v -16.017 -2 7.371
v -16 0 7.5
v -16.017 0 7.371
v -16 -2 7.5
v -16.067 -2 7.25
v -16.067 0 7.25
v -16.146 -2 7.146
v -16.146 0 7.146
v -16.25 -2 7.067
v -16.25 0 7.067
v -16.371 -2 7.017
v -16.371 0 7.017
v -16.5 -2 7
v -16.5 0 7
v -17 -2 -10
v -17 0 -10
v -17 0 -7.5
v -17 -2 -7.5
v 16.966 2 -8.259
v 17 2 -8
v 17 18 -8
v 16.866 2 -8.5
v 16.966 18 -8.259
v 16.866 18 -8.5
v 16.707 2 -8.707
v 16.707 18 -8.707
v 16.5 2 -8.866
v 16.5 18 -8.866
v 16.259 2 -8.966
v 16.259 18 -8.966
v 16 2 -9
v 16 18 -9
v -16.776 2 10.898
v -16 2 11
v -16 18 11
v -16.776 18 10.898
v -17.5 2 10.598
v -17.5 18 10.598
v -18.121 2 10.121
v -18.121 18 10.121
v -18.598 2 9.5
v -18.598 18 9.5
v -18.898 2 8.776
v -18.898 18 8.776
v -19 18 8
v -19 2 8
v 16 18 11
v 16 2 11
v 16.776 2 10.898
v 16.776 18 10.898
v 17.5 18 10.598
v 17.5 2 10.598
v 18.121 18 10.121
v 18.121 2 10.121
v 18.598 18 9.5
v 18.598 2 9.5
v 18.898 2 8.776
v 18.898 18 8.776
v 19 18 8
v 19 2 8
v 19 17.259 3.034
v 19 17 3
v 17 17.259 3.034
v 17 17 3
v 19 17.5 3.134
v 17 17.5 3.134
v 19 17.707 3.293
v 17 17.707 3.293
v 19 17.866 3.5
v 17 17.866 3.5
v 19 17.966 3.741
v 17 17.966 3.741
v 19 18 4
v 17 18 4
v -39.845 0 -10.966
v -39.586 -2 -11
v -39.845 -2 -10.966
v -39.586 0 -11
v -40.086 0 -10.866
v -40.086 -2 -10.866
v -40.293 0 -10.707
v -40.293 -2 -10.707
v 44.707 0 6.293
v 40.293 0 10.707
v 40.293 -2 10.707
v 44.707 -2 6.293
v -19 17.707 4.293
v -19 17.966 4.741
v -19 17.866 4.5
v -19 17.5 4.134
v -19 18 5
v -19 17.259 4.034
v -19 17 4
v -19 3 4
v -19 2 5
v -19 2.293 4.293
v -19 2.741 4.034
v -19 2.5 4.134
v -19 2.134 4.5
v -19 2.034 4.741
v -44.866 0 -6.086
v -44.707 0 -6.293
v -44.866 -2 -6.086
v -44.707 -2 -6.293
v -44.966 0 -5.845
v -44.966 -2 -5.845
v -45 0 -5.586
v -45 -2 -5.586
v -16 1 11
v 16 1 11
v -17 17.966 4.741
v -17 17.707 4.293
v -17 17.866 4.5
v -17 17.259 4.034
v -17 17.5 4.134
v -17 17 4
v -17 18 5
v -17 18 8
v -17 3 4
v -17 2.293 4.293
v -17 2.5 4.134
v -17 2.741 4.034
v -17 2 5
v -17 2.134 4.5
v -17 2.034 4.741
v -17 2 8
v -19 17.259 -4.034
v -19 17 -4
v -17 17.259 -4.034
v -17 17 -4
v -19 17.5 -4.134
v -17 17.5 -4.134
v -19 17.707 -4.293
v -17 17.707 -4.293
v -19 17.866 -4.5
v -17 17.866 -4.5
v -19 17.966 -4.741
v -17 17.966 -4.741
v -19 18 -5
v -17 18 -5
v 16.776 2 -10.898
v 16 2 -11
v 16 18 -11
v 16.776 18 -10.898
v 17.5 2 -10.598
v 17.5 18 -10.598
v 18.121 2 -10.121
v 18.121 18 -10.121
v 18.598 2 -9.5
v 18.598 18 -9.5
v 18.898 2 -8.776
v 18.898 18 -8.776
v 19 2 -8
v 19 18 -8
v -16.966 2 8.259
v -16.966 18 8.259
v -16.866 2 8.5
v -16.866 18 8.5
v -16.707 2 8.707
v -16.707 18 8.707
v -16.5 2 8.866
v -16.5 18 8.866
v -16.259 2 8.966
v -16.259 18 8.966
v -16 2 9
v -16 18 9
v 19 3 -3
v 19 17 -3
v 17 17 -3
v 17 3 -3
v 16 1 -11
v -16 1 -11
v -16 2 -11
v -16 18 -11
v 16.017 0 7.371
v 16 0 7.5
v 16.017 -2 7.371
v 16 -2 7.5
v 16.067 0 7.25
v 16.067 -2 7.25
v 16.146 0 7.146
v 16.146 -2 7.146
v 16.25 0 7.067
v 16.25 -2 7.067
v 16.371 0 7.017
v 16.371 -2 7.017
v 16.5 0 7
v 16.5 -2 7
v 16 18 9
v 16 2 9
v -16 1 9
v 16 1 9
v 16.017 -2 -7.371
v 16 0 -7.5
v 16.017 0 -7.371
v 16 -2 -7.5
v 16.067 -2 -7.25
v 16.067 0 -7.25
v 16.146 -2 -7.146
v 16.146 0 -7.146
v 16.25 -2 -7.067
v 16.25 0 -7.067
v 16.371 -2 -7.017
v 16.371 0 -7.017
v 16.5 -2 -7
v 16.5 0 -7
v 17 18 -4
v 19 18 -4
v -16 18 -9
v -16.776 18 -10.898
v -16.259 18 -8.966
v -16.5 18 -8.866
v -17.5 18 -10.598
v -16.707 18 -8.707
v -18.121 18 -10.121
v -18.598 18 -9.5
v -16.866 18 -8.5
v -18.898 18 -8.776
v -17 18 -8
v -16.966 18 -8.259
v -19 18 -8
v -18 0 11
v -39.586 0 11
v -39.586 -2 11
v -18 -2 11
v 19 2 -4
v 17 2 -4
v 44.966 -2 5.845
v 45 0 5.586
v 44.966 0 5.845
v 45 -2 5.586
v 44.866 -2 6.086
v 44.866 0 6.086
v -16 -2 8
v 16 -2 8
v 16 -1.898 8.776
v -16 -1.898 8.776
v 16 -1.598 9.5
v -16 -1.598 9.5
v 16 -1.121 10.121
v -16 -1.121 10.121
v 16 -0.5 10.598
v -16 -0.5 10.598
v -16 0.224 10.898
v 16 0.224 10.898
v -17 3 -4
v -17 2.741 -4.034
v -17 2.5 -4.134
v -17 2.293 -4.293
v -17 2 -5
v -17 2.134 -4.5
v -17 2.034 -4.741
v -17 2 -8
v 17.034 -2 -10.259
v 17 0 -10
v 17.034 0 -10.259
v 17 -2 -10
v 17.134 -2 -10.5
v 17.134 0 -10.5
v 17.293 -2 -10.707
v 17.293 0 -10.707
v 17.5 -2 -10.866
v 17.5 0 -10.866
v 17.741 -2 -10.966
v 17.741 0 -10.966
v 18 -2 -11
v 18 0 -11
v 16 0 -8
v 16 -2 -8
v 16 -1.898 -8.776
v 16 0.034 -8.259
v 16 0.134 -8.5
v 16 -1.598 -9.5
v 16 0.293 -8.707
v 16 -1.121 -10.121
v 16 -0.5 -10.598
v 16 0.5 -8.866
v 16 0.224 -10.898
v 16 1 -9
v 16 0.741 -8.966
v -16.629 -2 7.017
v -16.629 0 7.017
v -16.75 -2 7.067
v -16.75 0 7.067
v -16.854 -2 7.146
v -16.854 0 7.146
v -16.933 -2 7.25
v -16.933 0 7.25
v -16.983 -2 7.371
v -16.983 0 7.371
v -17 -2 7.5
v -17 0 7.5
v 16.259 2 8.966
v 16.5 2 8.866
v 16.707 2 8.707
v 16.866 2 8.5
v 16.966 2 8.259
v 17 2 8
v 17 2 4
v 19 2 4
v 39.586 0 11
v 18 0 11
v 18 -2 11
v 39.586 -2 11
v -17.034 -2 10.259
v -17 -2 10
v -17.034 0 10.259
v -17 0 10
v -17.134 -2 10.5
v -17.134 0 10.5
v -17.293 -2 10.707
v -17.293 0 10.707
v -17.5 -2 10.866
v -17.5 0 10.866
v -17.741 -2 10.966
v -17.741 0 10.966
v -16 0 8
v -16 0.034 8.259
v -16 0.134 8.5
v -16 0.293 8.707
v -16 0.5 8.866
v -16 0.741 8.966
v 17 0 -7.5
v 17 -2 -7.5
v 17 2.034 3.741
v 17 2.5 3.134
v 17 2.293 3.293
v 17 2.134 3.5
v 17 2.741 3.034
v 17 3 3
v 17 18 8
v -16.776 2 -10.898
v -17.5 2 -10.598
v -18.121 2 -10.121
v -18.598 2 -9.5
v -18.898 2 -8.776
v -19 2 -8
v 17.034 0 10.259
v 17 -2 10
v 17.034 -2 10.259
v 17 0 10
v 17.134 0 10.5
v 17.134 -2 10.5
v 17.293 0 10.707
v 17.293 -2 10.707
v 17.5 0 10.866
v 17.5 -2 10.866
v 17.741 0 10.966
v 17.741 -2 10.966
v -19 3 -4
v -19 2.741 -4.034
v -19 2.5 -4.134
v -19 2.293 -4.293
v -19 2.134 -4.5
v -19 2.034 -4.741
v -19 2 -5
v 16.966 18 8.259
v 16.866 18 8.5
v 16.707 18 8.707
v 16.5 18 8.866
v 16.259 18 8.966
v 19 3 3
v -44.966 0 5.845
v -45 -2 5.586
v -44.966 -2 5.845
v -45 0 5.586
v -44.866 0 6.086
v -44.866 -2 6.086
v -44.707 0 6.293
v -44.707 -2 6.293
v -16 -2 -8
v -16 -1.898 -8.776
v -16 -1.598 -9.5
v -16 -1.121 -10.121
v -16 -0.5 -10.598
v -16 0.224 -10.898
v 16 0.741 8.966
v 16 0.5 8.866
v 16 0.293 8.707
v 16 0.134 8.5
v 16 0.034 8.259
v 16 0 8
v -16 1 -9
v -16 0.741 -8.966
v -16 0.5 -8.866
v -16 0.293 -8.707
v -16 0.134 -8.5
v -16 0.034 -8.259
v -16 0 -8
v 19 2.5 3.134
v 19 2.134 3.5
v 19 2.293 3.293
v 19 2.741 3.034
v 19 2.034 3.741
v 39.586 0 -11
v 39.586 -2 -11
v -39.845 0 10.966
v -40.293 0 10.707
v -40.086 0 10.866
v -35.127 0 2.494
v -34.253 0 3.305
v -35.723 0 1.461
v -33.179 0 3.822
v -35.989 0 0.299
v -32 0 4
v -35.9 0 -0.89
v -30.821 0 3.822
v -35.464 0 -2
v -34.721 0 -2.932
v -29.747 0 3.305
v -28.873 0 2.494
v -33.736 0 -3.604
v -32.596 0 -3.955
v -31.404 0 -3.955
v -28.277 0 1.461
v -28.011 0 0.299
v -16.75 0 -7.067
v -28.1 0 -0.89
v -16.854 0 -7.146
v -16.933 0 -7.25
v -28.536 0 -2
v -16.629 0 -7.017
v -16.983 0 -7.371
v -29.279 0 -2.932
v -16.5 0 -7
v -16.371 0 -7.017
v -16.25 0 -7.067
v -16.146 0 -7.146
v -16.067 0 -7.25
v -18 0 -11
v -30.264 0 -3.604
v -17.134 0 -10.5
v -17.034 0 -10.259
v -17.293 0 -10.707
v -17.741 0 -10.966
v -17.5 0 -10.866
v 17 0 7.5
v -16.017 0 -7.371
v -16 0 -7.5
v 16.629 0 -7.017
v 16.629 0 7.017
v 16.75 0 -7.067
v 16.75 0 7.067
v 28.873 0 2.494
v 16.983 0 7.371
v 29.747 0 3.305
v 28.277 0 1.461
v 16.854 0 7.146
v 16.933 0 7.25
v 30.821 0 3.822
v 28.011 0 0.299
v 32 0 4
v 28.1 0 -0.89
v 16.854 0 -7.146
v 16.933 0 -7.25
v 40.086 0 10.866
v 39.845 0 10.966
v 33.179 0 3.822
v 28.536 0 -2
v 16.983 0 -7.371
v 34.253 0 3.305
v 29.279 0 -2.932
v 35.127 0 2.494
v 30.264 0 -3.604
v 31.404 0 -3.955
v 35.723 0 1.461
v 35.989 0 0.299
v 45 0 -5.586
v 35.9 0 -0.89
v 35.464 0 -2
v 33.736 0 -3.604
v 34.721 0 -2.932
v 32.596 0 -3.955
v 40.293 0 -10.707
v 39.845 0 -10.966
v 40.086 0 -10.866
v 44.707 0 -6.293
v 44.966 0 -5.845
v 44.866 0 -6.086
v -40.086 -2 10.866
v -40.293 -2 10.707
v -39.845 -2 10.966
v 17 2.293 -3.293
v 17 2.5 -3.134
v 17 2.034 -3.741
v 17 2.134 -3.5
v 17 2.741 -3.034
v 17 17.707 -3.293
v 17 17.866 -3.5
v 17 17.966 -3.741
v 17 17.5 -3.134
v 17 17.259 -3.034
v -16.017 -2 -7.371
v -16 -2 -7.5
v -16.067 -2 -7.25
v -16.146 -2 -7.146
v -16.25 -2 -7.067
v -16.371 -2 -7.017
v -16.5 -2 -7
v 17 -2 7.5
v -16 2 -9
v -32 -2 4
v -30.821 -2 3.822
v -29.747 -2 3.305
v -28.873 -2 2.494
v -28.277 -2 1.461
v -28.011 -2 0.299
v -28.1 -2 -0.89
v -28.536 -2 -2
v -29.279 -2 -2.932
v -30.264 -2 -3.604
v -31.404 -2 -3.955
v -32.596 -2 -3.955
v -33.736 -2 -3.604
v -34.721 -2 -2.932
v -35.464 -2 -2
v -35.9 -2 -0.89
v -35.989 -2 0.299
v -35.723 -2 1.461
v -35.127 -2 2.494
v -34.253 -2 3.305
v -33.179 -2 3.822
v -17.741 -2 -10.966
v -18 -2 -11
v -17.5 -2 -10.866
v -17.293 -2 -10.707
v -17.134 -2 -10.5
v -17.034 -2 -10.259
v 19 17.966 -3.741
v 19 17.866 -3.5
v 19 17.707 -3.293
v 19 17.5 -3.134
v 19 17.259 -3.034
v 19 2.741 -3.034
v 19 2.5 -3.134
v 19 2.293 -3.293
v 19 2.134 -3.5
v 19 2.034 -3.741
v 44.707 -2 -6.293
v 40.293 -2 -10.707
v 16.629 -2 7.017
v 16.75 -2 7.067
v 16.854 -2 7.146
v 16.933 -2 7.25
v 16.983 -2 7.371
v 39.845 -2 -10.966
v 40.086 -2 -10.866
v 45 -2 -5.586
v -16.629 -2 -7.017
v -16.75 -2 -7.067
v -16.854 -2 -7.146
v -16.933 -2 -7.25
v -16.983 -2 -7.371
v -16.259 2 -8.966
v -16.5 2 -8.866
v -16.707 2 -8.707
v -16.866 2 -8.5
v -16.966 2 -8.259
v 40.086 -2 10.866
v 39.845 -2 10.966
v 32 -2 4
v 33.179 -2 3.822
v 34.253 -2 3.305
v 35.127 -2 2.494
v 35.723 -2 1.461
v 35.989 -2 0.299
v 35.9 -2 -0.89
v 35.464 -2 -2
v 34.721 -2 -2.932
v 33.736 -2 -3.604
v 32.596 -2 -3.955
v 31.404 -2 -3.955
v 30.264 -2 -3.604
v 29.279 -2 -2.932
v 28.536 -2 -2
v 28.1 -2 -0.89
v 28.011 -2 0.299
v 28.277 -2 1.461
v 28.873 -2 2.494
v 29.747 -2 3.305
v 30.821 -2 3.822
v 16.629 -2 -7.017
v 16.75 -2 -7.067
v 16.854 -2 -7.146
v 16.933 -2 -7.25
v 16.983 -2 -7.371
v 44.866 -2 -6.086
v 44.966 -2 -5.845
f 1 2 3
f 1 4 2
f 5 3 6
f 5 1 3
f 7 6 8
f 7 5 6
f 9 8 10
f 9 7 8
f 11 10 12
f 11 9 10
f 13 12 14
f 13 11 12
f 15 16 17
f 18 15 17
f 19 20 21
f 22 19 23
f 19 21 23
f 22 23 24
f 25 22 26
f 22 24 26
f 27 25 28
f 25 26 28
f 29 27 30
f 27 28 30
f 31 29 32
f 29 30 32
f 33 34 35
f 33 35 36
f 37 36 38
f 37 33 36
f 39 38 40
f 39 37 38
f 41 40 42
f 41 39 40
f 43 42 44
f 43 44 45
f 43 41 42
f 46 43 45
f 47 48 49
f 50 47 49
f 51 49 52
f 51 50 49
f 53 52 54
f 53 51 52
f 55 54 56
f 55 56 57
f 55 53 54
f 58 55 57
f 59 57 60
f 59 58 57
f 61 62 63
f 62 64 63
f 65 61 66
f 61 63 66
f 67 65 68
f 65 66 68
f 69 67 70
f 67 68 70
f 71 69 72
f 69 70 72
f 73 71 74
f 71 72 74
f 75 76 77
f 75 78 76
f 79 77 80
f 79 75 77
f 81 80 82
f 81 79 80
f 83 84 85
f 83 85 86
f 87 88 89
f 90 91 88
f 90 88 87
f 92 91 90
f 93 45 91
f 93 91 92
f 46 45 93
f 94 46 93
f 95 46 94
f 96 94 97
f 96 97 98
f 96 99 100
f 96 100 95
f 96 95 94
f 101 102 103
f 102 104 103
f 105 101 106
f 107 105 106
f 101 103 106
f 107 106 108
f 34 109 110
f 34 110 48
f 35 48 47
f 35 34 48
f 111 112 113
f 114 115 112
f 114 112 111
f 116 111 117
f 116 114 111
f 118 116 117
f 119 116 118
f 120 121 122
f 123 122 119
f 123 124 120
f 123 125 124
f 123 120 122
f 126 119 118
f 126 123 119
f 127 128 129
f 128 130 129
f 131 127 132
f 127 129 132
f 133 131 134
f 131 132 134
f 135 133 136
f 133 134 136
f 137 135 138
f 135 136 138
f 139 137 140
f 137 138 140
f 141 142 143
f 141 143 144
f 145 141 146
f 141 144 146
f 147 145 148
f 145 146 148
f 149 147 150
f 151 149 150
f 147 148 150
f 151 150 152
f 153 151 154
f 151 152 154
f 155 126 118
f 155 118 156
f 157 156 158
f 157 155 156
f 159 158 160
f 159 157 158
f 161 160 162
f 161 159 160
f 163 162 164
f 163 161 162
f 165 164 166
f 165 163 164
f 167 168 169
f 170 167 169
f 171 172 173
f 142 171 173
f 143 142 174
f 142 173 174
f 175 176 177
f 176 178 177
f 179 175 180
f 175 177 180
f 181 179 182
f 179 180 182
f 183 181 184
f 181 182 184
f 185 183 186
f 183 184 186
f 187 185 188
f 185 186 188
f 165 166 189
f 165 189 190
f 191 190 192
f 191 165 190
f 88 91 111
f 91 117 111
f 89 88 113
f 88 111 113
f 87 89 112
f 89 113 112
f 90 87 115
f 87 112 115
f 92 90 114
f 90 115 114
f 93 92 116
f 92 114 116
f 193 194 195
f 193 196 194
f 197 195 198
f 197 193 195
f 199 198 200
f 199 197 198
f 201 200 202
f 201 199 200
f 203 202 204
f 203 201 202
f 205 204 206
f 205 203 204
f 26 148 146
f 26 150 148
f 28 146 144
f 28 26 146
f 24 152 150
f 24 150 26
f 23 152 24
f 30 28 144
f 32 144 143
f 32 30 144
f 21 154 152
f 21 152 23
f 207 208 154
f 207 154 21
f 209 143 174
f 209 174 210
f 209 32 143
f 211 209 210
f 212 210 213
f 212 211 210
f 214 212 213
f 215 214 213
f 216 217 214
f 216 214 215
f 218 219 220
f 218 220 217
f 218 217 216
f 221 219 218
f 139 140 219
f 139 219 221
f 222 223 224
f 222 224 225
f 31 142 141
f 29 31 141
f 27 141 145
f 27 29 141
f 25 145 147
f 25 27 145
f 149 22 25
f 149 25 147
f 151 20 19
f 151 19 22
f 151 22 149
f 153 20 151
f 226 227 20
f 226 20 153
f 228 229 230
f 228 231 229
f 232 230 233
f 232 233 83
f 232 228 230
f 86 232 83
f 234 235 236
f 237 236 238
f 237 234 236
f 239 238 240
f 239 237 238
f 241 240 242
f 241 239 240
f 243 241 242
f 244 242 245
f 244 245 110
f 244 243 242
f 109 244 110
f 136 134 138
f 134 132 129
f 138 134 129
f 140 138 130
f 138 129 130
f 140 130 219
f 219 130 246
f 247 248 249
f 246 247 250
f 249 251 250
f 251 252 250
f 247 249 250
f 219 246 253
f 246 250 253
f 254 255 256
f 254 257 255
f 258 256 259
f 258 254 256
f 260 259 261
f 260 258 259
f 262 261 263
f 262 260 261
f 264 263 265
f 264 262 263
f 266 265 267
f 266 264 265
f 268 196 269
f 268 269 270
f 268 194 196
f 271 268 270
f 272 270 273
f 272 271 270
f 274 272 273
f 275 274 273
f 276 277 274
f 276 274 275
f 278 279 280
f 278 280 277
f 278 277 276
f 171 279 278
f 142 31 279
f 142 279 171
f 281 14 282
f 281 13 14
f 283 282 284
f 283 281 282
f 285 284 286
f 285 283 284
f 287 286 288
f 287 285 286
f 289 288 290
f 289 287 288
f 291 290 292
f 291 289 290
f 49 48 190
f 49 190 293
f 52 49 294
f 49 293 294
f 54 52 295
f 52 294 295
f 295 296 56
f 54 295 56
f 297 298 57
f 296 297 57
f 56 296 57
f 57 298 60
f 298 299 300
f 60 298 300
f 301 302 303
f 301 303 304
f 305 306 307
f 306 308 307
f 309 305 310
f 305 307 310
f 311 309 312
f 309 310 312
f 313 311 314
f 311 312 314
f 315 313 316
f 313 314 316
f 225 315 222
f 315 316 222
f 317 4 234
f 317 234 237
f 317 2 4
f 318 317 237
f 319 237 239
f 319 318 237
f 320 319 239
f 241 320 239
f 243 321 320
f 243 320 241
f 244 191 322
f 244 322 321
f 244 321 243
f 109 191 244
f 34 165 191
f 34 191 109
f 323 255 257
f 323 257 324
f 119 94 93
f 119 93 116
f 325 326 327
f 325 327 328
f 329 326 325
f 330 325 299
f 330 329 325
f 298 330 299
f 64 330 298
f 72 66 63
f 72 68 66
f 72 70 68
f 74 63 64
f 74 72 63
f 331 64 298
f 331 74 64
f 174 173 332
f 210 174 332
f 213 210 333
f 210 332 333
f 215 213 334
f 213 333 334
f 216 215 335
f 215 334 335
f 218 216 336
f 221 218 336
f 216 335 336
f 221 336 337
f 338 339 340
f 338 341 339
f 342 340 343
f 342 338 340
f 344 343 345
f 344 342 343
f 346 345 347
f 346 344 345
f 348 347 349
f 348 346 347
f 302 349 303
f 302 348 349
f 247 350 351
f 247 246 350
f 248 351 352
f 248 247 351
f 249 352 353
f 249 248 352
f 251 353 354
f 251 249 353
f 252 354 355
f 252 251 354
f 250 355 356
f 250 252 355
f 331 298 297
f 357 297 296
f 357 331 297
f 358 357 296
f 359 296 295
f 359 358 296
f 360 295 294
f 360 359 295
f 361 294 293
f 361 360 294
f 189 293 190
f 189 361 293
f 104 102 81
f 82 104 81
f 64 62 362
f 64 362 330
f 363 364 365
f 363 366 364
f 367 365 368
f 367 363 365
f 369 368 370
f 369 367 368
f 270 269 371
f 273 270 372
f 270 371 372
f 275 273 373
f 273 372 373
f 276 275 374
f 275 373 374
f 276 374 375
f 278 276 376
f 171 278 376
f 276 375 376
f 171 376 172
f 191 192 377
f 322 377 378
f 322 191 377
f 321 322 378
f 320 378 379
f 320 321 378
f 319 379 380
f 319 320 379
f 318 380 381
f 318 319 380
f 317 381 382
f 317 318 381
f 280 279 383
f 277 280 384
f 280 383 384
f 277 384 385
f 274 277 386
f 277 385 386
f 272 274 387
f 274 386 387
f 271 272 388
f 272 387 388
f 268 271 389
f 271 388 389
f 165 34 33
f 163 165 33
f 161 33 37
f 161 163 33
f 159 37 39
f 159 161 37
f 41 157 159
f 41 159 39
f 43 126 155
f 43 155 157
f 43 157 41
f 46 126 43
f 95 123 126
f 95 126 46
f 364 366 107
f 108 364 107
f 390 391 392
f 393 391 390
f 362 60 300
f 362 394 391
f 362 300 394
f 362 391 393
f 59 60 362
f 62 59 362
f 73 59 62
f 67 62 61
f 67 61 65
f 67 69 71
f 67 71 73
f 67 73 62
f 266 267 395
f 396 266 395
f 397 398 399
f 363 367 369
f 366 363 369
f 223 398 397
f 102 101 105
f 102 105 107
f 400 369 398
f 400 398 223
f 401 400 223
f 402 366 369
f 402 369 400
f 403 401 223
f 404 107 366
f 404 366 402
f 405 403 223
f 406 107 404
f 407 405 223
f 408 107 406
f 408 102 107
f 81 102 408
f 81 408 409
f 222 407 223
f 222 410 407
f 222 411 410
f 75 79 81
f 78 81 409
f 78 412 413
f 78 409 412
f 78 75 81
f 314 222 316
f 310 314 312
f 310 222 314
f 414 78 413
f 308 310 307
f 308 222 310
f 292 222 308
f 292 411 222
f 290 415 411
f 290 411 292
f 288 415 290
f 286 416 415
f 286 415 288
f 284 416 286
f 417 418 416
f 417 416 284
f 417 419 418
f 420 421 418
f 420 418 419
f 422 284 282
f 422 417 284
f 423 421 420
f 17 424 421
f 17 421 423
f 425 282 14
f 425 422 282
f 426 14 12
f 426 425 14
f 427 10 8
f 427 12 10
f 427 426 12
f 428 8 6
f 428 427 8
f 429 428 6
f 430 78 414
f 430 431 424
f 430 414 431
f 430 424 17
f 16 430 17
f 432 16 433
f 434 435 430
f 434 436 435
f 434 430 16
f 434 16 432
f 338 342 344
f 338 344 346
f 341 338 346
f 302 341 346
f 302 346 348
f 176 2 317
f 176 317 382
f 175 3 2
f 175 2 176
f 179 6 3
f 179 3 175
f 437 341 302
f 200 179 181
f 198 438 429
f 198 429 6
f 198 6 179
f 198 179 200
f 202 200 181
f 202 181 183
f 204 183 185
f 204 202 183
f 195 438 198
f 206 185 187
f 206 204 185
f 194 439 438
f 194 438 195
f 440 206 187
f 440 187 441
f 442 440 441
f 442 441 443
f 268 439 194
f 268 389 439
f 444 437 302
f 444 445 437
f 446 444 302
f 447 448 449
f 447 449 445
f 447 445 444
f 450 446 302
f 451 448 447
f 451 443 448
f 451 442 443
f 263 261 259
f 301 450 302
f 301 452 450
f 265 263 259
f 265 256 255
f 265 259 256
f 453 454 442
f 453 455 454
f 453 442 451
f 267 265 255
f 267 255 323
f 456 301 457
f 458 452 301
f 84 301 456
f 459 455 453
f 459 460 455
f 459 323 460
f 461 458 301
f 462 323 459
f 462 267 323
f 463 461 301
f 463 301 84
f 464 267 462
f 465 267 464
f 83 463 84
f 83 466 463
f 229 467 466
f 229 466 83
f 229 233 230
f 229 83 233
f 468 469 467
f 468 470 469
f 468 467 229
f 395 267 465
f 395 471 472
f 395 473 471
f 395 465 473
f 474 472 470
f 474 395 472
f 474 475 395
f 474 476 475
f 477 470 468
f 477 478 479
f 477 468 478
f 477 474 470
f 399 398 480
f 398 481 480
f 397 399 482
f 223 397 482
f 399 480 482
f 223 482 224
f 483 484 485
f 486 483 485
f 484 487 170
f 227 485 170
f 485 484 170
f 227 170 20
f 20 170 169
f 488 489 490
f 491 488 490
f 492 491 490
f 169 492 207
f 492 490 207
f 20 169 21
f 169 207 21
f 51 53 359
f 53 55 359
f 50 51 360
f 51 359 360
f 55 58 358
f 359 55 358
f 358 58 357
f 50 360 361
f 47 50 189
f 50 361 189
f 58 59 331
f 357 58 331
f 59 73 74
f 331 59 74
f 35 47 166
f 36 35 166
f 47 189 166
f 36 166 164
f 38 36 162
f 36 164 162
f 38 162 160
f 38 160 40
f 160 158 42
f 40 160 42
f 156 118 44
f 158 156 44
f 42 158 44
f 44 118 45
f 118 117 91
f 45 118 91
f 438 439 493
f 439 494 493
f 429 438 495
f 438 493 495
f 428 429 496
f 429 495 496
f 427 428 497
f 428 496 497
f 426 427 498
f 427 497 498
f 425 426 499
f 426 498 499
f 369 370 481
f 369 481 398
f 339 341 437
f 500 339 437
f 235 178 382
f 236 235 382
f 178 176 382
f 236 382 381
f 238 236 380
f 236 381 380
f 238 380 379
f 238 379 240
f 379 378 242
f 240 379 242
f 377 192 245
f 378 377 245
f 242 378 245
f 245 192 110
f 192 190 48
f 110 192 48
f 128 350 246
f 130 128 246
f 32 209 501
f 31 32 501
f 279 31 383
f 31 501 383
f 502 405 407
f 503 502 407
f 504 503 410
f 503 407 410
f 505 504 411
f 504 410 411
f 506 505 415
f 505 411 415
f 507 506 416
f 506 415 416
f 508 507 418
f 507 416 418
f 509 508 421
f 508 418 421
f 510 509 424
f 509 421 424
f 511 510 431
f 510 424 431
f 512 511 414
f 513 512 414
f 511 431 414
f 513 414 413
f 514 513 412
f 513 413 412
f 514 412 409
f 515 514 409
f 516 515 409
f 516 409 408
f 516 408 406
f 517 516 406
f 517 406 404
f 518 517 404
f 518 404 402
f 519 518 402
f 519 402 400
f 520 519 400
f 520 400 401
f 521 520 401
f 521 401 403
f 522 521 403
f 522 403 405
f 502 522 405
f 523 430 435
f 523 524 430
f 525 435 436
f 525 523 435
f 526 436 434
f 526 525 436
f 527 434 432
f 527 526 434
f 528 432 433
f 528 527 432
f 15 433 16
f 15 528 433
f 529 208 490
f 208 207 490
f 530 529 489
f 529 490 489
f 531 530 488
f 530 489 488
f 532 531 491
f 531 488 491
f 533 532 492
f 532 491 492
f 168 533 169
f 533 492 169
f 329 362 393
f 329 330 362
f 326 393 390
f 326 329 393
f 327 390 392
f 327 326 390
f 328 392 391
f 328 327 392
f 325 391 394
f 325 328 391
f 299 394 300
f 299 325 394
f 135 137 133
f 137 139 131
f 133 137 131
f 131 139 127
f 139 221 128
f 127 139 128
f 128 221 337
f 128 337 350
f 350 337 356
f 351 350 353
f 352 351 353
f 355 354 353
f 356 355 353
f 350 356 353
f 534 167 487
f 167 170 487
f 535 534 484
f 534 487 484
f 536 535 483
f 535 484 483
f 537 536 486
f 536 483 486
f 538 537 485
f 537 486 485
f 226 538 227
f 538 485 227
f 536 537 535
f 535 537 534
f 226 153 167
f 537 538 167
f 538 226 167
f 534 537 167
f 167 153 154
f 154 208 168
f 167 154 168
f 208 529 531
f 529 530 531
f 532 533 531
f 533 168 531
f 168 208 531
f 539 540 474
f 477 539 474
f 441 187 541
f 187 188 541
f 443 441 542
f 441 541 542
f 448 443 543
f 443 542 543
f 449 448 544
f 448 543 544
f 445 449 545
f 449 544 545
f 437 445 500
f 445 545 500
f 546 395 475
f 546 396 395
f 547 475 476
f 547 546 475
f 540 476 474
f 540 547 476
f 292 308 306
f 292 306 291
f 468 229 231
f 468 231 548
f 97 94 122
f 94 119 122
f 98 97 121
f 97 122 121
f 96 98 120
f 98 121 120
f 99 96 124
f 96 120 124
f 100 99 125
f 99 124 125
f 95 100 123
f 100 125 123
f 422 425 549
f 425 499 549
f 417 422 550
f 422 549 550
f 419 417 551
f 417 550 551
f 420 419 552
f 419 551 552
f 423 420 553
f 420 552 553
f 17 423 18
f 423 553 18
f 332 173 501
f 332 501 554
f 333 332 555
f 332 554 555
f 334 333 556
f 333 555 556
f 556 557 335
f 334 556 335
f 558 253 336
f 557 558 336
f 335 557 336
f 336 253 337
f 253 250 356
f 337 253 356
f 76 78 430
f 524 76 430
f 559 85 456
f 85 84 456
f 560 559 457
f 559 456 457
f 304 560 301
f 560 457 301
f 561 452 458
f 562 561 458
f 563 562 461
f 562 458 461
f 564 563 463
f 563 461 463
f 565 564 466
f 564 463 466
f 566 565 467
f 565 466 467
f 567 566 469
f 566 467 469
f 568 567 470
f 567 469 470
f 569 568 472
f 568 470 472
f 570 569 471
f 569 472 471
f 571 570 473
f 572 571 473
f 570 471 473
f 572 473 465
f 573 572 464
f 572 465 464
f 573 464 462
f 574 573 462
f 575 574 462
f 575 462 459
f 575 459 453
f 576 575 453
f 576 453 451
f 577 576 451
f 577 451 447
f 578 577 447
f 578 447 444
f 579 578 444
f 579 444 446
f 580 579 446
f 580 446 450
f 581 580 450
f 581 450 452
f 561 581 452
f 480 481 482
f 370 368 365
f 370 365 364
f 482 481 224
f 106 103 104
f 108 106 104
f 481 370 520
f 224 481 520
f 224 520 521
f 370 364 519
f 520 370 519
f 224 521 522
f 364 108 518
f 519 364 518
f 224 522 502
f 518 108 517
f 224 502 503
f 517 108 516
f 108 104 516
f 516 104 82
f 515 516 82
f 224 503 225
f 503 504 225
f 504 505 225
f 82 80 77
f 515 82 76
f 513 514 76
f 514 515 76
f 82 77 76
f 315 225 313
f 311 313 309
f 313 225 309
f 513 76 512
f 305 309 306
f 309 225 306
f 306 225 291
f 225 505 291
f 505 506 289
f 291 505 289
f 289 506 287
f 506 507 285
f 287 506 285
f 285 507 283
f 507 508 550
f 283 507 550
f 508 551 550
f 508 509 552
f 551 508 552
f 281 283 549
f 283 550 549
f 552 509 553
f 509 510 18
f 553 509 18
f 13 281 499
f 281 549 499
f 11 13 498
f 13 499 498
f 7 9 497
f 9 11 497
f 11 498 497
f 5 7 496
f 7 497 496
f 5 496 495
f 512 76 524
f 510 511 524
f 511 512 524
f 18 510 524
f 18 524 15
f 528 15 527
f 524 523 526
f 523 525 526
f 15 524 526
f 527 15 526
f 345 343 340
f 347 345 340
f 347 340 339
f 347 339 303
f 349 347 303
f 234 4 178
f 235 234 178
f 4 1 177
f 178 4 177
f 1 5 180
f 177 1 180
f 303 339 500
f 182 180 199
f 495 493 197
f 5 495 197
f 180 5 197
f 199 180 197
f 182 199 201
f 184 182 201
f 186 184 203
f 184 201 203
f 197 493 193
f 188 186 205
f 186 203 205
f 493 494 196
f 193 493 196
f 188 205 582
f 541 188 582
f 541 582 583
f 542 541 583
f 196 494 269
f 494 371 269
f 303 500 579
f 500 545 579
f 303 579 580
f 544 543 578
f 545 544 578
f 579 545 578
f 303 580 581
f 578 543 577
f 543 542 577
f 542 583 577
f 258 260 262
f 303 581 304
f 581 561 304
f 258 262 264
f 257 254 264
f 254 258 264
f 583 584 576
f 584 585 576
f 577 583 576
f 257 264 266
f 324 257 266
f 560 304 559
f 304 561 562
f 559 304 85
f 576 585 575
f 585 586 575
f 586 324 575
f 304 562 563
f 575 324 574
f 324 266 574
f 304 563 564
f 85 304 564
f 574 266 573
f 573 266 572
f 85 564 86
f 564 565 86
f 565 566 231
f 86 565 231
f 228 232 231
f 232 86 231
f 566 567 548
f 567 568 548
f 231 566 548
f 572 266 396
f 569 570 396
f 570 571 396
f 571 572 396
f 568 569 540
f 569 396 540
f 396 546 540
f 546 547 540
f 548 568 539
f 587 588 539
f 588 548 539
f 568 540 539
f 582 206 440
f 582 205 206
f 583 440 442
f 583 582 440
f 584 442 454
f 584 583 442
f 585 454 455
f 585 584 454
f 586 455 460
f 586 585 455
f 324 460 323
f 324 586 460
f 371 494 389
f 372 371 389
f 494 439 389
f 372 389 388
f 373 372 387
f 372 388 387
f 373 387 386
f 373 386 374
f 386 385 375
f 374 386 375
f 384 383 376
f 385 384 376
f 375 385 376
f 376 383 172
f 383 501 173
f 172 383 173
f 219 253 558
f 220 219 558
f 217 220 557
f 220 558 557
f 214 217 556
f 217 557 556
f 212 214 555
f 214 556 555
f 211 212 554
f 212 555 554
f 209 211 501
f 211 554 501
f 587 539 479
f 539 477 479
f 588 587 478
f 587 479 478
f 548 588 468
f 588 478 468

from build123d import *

# Parameters (mm, degrees)
SKETCH1_W                     = 90
SKETCH1_H                     = 22
BASE_FLANGE1_DEPTH            = 2
EDGE_FLANGE4_STRIP_W          = 10
EDGE_FLANGE4_STRIP_H          = 2
EDGE_FLANGE4_STRIP_CUT_DEPTH  = 32
EDGE_FLANGE4_RELIEF_W         = 11
EDGE_FLANGE4_RELIEF_H         = 1
EDGE_FLANGE4_RELIEF_CUT_DEPTH = 2
EDGE_FLANGE4_DEPTH            = 32
EDGE_FLANGE8_DEPTH            = 16
EDGE_FLANGE9_DEPTH            = 16
FILLET2_R                     = 1
FILLET4_R                     = 1
FILLET5_R                     = 1
FILLET7_R                     = 0.5
FILLET8_R                     = 0.5
FILLET9_R                     = 0.5
FILLET10_R                    = 1
BREAK_CORNER2_START           = -39.597979746
BREAK_CORNER2_OUTLINE_W       = 72.124891682
BREAK_CORNER2_OUTLINE_H       = 4
BREAK_CORNER2_DEPTH           = 3.535533905
BREAK_CORNER2_START_2         = 36.062445841
BREAK_CORNER2_2_OUTLINE_W     = 72.124891682
BREAK_CORNER2_2_OUTLINE_H     = 4
BREAK_CORNER2_2_DEPTH         = 3.535533905
BREAK_CORNER2_START_3         = -27.577164466
BREAK_CORNER2_3_OUTLINE_W     = 3.937554159
BREAK_CORNER2_3_OUTLINE_H     = 4
BREAK_CORNER2_3_DEPTH         = 55.154328932
FILLET11_R                    = 1
FILLET12_R                    = 0.5
FILLET13_R                    = 1
SKETCH62_R                    = 4
CUT_EXTRUDE2_DEPTH            = 10
SKETCH63_R                    = 4
CUT_EXTRUDE3_DEPTH            = 10


# Read off the part's stored shape, not the designer's step: Break-Corner2
# Sheet-metal steps are written as plain solids
with BuildPart() as part:
    # Sketch1 → Base-Flange1 (new body)
    with BuildSketch(Plane(origin=(0, 0, 0), x_dir=(1, 0, 0), z_dir=(0, 1, 0))):
        Rectangle(SKETCH1_W, SKETCH1_H)
    extrude(amount=-BASE_FLANGE1_DEPTH)

    # Edge-Flange4 strip (across the edge) → Edge-Flange4 strip cut (cut)
    with BuildSketch(Plane(origin=(-16, 0, 11), x_dir=(0, 0, -1), z_dir=(1, 0, 0))):
        with Locations((-2, -1)):
            Rectangle(EDGE_FLANGE4_STRIP_W, EDGE_FLANGE4_STRIP_H)
    edge_flange4_strip_cut = extrude(amount=EDGE_FLANGE4_STRIP_CUT_DEPTH, mode=Mode.SUBTRACT)

    # Edge-Flange4 relief (on the sheet) → Edge-Flange4 relief cut (cut)
    with BuildSketch(Plane(origin=(-16, 0, 8), x_dir=(0, 0, -1), z_dir=(0, 1, 0))):
        with Locations((-4.5, 0.5)):
            Rectangle(EDGE_FLANGE4_RELIEF_W, EDGE_FLANGE4_RELIEF_H)
        with Locations((-4.5, -32.5)):
            Rectangle(EDGE_FLANGE4_RELIEF_W, EDGE_FLANGE4_RELIEF_H)
    edge_flange4_relief_cut = extrude(amount=-EDGE_FLANGE4_RELIEF_CUT_DEPTH, mode=Mode.SUBTRACT)

    # Edge-Flange4 section (across the edge) → Edge-Flange4 (add)
    with BuildSketch(Plane(origin=(-16, 0, 11), x_dir=(0, 0, -1), z_dir=(1, 0, 0))):
        with BuildLine():
            Line((0, 1), (0, 18))
            Line((0, 18), (2, 18))
            Line((2, 18), (2, 1))
            ThreePointArc((2, 1), (2.292893219, 0.292893219), (3, 0))
            Line((3, 0), (3, -2))
            ThreePointArc((3, -2), (0.878679656, -1.121320344), (0, 1))
        make_face()
    edge_flange4 = extrude(amount=EDGE_FLANGE4_DEPTH)

    # Edge-Flange8 section (across the edge) → Edge-Flange8 (add)
    with BuildSketch(Plane(origin=(17, 18, 9), x_dir=(-1, 0, 0), z_dir=(0, -1, 0))):
        with BuildLine():
            Line((-2, 1), (-2, 6))
            Line((-2, 6), (0, 6))
            Line((0, 6), (0, 1))
            ThreePointArc((0, 1), (0.292893219, 0.292893219), (1, 0))
            Line((1, 0), (1, -2))
            ThreePointArc((1, -2), (-1.121320344, -1.121320344), (-2, 1))
        make_face()
    edge_flange8 = extrude(amount=EDGE_FLANGE8_DEPTH)

    # Edge-Flange9 section (across the edge) → Edge-Flange9 (add)
    with BuildSketch(Plane(origin=(-17, 2, 9), x_dir=(1, 0, 0), z_dir=(0, 1, 0))):
        with BuildLine():
            Line((-2, 1), (-2, 5))
            Line((-2, 5), (0, 5))
            Line((0, 5), (0, 1))
            ThreePointArc((0, 1), (0.292893219, 0.292893219), (1, 0))
            Line((1, 0), (1, -2))
            ThreePointArc((1, -2), (-1.121320344, -1.121320344), (-2, 1))
        make_face()
    edge_flange9 = extrude(amount=EDGE_FLANGE9_DEPTH)

    # Fillet2
    fillet2_edges = [part.edges().sort_by_distance(p)[0] for p in [
        (18, 2, 3),
    ]]
    fillet(fillet2_edges, radius=FILLET2_R)

    # Fillet4
    fillet4_edges = [part.edges().sort_by_distance(p)[0] for p in [
        (-18, 18, 4),
        (18, 18, 3),
    ]]
    fillet(fillet4_edges, radius=FILLET4_R)

    # Fillet5
    fillet5_edges = [part.edges().sort_by_distance(p)[0] for p in [
        (-18, 2, 4),
    ]]
    fillet(fillet5_edges, radius=FILLET5_R)

    # Fillet7
    fillet7_edges = [part.edges().sort_by_distance(p)[0] for p in [
        (16, -1, 7),
    ]]
    fillet(fillet7_edges, radius=FILLET7_R)

    # Fillet8
    fillet8_edges = [part.edges().sort_by_distance(p)[0] for p in [
        (17, -1, 7),
    ]]
    fillet(fillet8_edges, radius=FILLET8_R - 0.0001)  # a hair under: the kernel refuses the full size

    # Fillet9
    fillet9_edges = [part.edges().sort_by_distance(p)[0] for p in [
        (-16, -1, 7),
        (-17, -1, 7),
    ]]
    fillet(fillet9_edges, radius=FILLET9_R - 0.0001)  # a hair under: the kernel refuses the full size

    # Fillet10
    fillet10_edges = [part.edges().sort_by_distance(p)[0] for p in [
        (17, -1, 11),
        (-17, -1, 11),
    ]]
    fillet(fillet10_edges, radius=FILLET10_R)

    # Break-Corner2 outline → Break-Corner2 (cut)
    with BuildSketch(Plane(origin=(0, 0, 0), x_dir=(0.7071067811865471, 0, -0.707106781186548), z_dir=(0.707106781186548, 0, 0.707106781186547)).offset(BREAK_CORNER2_START)):
        with Locations((0, -1)):
            Rectangle(BREAK_CORNER2_OUTLINE_W, BREAK_CORNER2_OUTLINE_H)
    extrude(amount=BREAK_CORNER2_DEPTH, mode=Mode.SUBTRACT)

    # Break-Corner2 2 outline → Break-Corner2 2 (cut)
    with BuildSketch(Plane(origin=(0, 0, 0), x_dir=(0.7071067811865471, 0, -0.707106781186548), z_dir=(0.707106781186548, 0, 0.707106781186547)).offset(BREAK_CORNER2_START_2)):
        with Locations((0, -1)):
            Rectangle(BREAK_CORNER2_2_OUTLINE_W, BREAK_CORNER2_2_OUTLINE_H)
    extrude(amount=BREAK_CORNER2_2_DEPTH, mode=Mode.SUBTRACT)

    # Break-Corner2 3 outline → Break-Corner2 3 (cut)
    with BuildSketch(Plane(origin=(0, 0, 0), x_dir=(0.7071067811865471, 0, -0.707106781186548), z_dir=(0.707106781186548, 0, 0.707106781186547)).offset(BREAK_CORNER2_START_3)):
        with Locations((38.03122292, -1)):
            Rectangle(BREAK_CORNER2_3_OUTLINE_W, BREAK_CORNER2_3_OUTLINE_H)
        with Locations((-38.03122292, -1)):
            Rectangle(BREAK_CORNER2_3_OUTLINE_W, BREAK_CORNER2_3_OUTLINE_H)
    extrude(amount=BREAK_CORNER2_3_DEPTH, mode=Mode.SUBTRACT)

    # Mirror1: Edge-Flange4 strip cut, Edge-Flange4 relief cut, Edge-Flange4, Edge-Flange8, Edge-Flange9 across plane
    add(edge_flange4_strip_cut.mirror(Plane.XY), mode=Mode.SUBTRACT)
    add(edge_flange4_relief_cut.mirror(Plane.XY), mode=Mode.SUBTRACT)
    add(edge_flange4.mirror(Plane.XY))
    add(edge_flange8.mirror(Plane.XY))
    add(edge_flange9.mirror(Plane.XY))

    # Fillet11
    fillet11_edges = [part.edges().sort_by_distance(p)[0] for p in [
        (17, -1, -11),
        (-17, -1, -11),
        (-18, 2, -4),
        (-18, 18, -4),
        (18, 2, -3),
        (18, 18, -3),
    ]]
    fillet(fillet11_edges, radius=FILLET11_R)

    # Fillet12
    fillet12_edges = [part.edges().sort_by_distance(p)[0] for p in [
        (-17, -1, -7),
        (-16, -1, -7),
        (16, -1, -7),
        (17, -1, -7),
    ]]
    fillet(fillet12_edges, radius=FILLET12_R - 0.0001)  # a hair under: the kernel refuses the full size

    # Fillet13
    fillet13_edges = [part.edges().sort_by_distance(p)[0] for p in [
        (40.000000001, -1, 11),
        (45, -1, 6.000000001),
        (45, -1, -6.000000001),
        (40.000000001, -1, -11),
        (-40.000000001, -1, -11),
        (-45, -1, -6.000000001),
        (-45, -1, 6.000000001),
        (-40.000000001, -1, 11),
    ]]
    fillet(fillet13_edges, radius=FILLET13_R)

    # Sketch62 → Cut-Extrude2 (cut)
    with BuildSketch(Plane(origin=(0, 0, 0), x_dir=(1, 0, 0), z_dir=(0, 1, 0))):
        with Locations(Location((-32, 0, 0), (0, 0, 270))):
            Circle(SKETCH62_R)
    extrude(amount=-CUT_EXTRUDE2_DEPTH, mode=Mode.SUBTRACT)

    # Sketch63 → Cut-Extrude3 (cut)
    with BuildSketch(Plane(origin=(0, 0, 0), x_dir=(1, 0, 0), z_dir=(0, 1, 0))):
        with Locations(Location((32, 0, 0), (0, 0, 270))):
            Circle(SKETCH63_R)
    extrude(amount=-CUT_EXTRUDE3_DEPTH, mode=Mode.SUBTRACT)


solid = part.part
